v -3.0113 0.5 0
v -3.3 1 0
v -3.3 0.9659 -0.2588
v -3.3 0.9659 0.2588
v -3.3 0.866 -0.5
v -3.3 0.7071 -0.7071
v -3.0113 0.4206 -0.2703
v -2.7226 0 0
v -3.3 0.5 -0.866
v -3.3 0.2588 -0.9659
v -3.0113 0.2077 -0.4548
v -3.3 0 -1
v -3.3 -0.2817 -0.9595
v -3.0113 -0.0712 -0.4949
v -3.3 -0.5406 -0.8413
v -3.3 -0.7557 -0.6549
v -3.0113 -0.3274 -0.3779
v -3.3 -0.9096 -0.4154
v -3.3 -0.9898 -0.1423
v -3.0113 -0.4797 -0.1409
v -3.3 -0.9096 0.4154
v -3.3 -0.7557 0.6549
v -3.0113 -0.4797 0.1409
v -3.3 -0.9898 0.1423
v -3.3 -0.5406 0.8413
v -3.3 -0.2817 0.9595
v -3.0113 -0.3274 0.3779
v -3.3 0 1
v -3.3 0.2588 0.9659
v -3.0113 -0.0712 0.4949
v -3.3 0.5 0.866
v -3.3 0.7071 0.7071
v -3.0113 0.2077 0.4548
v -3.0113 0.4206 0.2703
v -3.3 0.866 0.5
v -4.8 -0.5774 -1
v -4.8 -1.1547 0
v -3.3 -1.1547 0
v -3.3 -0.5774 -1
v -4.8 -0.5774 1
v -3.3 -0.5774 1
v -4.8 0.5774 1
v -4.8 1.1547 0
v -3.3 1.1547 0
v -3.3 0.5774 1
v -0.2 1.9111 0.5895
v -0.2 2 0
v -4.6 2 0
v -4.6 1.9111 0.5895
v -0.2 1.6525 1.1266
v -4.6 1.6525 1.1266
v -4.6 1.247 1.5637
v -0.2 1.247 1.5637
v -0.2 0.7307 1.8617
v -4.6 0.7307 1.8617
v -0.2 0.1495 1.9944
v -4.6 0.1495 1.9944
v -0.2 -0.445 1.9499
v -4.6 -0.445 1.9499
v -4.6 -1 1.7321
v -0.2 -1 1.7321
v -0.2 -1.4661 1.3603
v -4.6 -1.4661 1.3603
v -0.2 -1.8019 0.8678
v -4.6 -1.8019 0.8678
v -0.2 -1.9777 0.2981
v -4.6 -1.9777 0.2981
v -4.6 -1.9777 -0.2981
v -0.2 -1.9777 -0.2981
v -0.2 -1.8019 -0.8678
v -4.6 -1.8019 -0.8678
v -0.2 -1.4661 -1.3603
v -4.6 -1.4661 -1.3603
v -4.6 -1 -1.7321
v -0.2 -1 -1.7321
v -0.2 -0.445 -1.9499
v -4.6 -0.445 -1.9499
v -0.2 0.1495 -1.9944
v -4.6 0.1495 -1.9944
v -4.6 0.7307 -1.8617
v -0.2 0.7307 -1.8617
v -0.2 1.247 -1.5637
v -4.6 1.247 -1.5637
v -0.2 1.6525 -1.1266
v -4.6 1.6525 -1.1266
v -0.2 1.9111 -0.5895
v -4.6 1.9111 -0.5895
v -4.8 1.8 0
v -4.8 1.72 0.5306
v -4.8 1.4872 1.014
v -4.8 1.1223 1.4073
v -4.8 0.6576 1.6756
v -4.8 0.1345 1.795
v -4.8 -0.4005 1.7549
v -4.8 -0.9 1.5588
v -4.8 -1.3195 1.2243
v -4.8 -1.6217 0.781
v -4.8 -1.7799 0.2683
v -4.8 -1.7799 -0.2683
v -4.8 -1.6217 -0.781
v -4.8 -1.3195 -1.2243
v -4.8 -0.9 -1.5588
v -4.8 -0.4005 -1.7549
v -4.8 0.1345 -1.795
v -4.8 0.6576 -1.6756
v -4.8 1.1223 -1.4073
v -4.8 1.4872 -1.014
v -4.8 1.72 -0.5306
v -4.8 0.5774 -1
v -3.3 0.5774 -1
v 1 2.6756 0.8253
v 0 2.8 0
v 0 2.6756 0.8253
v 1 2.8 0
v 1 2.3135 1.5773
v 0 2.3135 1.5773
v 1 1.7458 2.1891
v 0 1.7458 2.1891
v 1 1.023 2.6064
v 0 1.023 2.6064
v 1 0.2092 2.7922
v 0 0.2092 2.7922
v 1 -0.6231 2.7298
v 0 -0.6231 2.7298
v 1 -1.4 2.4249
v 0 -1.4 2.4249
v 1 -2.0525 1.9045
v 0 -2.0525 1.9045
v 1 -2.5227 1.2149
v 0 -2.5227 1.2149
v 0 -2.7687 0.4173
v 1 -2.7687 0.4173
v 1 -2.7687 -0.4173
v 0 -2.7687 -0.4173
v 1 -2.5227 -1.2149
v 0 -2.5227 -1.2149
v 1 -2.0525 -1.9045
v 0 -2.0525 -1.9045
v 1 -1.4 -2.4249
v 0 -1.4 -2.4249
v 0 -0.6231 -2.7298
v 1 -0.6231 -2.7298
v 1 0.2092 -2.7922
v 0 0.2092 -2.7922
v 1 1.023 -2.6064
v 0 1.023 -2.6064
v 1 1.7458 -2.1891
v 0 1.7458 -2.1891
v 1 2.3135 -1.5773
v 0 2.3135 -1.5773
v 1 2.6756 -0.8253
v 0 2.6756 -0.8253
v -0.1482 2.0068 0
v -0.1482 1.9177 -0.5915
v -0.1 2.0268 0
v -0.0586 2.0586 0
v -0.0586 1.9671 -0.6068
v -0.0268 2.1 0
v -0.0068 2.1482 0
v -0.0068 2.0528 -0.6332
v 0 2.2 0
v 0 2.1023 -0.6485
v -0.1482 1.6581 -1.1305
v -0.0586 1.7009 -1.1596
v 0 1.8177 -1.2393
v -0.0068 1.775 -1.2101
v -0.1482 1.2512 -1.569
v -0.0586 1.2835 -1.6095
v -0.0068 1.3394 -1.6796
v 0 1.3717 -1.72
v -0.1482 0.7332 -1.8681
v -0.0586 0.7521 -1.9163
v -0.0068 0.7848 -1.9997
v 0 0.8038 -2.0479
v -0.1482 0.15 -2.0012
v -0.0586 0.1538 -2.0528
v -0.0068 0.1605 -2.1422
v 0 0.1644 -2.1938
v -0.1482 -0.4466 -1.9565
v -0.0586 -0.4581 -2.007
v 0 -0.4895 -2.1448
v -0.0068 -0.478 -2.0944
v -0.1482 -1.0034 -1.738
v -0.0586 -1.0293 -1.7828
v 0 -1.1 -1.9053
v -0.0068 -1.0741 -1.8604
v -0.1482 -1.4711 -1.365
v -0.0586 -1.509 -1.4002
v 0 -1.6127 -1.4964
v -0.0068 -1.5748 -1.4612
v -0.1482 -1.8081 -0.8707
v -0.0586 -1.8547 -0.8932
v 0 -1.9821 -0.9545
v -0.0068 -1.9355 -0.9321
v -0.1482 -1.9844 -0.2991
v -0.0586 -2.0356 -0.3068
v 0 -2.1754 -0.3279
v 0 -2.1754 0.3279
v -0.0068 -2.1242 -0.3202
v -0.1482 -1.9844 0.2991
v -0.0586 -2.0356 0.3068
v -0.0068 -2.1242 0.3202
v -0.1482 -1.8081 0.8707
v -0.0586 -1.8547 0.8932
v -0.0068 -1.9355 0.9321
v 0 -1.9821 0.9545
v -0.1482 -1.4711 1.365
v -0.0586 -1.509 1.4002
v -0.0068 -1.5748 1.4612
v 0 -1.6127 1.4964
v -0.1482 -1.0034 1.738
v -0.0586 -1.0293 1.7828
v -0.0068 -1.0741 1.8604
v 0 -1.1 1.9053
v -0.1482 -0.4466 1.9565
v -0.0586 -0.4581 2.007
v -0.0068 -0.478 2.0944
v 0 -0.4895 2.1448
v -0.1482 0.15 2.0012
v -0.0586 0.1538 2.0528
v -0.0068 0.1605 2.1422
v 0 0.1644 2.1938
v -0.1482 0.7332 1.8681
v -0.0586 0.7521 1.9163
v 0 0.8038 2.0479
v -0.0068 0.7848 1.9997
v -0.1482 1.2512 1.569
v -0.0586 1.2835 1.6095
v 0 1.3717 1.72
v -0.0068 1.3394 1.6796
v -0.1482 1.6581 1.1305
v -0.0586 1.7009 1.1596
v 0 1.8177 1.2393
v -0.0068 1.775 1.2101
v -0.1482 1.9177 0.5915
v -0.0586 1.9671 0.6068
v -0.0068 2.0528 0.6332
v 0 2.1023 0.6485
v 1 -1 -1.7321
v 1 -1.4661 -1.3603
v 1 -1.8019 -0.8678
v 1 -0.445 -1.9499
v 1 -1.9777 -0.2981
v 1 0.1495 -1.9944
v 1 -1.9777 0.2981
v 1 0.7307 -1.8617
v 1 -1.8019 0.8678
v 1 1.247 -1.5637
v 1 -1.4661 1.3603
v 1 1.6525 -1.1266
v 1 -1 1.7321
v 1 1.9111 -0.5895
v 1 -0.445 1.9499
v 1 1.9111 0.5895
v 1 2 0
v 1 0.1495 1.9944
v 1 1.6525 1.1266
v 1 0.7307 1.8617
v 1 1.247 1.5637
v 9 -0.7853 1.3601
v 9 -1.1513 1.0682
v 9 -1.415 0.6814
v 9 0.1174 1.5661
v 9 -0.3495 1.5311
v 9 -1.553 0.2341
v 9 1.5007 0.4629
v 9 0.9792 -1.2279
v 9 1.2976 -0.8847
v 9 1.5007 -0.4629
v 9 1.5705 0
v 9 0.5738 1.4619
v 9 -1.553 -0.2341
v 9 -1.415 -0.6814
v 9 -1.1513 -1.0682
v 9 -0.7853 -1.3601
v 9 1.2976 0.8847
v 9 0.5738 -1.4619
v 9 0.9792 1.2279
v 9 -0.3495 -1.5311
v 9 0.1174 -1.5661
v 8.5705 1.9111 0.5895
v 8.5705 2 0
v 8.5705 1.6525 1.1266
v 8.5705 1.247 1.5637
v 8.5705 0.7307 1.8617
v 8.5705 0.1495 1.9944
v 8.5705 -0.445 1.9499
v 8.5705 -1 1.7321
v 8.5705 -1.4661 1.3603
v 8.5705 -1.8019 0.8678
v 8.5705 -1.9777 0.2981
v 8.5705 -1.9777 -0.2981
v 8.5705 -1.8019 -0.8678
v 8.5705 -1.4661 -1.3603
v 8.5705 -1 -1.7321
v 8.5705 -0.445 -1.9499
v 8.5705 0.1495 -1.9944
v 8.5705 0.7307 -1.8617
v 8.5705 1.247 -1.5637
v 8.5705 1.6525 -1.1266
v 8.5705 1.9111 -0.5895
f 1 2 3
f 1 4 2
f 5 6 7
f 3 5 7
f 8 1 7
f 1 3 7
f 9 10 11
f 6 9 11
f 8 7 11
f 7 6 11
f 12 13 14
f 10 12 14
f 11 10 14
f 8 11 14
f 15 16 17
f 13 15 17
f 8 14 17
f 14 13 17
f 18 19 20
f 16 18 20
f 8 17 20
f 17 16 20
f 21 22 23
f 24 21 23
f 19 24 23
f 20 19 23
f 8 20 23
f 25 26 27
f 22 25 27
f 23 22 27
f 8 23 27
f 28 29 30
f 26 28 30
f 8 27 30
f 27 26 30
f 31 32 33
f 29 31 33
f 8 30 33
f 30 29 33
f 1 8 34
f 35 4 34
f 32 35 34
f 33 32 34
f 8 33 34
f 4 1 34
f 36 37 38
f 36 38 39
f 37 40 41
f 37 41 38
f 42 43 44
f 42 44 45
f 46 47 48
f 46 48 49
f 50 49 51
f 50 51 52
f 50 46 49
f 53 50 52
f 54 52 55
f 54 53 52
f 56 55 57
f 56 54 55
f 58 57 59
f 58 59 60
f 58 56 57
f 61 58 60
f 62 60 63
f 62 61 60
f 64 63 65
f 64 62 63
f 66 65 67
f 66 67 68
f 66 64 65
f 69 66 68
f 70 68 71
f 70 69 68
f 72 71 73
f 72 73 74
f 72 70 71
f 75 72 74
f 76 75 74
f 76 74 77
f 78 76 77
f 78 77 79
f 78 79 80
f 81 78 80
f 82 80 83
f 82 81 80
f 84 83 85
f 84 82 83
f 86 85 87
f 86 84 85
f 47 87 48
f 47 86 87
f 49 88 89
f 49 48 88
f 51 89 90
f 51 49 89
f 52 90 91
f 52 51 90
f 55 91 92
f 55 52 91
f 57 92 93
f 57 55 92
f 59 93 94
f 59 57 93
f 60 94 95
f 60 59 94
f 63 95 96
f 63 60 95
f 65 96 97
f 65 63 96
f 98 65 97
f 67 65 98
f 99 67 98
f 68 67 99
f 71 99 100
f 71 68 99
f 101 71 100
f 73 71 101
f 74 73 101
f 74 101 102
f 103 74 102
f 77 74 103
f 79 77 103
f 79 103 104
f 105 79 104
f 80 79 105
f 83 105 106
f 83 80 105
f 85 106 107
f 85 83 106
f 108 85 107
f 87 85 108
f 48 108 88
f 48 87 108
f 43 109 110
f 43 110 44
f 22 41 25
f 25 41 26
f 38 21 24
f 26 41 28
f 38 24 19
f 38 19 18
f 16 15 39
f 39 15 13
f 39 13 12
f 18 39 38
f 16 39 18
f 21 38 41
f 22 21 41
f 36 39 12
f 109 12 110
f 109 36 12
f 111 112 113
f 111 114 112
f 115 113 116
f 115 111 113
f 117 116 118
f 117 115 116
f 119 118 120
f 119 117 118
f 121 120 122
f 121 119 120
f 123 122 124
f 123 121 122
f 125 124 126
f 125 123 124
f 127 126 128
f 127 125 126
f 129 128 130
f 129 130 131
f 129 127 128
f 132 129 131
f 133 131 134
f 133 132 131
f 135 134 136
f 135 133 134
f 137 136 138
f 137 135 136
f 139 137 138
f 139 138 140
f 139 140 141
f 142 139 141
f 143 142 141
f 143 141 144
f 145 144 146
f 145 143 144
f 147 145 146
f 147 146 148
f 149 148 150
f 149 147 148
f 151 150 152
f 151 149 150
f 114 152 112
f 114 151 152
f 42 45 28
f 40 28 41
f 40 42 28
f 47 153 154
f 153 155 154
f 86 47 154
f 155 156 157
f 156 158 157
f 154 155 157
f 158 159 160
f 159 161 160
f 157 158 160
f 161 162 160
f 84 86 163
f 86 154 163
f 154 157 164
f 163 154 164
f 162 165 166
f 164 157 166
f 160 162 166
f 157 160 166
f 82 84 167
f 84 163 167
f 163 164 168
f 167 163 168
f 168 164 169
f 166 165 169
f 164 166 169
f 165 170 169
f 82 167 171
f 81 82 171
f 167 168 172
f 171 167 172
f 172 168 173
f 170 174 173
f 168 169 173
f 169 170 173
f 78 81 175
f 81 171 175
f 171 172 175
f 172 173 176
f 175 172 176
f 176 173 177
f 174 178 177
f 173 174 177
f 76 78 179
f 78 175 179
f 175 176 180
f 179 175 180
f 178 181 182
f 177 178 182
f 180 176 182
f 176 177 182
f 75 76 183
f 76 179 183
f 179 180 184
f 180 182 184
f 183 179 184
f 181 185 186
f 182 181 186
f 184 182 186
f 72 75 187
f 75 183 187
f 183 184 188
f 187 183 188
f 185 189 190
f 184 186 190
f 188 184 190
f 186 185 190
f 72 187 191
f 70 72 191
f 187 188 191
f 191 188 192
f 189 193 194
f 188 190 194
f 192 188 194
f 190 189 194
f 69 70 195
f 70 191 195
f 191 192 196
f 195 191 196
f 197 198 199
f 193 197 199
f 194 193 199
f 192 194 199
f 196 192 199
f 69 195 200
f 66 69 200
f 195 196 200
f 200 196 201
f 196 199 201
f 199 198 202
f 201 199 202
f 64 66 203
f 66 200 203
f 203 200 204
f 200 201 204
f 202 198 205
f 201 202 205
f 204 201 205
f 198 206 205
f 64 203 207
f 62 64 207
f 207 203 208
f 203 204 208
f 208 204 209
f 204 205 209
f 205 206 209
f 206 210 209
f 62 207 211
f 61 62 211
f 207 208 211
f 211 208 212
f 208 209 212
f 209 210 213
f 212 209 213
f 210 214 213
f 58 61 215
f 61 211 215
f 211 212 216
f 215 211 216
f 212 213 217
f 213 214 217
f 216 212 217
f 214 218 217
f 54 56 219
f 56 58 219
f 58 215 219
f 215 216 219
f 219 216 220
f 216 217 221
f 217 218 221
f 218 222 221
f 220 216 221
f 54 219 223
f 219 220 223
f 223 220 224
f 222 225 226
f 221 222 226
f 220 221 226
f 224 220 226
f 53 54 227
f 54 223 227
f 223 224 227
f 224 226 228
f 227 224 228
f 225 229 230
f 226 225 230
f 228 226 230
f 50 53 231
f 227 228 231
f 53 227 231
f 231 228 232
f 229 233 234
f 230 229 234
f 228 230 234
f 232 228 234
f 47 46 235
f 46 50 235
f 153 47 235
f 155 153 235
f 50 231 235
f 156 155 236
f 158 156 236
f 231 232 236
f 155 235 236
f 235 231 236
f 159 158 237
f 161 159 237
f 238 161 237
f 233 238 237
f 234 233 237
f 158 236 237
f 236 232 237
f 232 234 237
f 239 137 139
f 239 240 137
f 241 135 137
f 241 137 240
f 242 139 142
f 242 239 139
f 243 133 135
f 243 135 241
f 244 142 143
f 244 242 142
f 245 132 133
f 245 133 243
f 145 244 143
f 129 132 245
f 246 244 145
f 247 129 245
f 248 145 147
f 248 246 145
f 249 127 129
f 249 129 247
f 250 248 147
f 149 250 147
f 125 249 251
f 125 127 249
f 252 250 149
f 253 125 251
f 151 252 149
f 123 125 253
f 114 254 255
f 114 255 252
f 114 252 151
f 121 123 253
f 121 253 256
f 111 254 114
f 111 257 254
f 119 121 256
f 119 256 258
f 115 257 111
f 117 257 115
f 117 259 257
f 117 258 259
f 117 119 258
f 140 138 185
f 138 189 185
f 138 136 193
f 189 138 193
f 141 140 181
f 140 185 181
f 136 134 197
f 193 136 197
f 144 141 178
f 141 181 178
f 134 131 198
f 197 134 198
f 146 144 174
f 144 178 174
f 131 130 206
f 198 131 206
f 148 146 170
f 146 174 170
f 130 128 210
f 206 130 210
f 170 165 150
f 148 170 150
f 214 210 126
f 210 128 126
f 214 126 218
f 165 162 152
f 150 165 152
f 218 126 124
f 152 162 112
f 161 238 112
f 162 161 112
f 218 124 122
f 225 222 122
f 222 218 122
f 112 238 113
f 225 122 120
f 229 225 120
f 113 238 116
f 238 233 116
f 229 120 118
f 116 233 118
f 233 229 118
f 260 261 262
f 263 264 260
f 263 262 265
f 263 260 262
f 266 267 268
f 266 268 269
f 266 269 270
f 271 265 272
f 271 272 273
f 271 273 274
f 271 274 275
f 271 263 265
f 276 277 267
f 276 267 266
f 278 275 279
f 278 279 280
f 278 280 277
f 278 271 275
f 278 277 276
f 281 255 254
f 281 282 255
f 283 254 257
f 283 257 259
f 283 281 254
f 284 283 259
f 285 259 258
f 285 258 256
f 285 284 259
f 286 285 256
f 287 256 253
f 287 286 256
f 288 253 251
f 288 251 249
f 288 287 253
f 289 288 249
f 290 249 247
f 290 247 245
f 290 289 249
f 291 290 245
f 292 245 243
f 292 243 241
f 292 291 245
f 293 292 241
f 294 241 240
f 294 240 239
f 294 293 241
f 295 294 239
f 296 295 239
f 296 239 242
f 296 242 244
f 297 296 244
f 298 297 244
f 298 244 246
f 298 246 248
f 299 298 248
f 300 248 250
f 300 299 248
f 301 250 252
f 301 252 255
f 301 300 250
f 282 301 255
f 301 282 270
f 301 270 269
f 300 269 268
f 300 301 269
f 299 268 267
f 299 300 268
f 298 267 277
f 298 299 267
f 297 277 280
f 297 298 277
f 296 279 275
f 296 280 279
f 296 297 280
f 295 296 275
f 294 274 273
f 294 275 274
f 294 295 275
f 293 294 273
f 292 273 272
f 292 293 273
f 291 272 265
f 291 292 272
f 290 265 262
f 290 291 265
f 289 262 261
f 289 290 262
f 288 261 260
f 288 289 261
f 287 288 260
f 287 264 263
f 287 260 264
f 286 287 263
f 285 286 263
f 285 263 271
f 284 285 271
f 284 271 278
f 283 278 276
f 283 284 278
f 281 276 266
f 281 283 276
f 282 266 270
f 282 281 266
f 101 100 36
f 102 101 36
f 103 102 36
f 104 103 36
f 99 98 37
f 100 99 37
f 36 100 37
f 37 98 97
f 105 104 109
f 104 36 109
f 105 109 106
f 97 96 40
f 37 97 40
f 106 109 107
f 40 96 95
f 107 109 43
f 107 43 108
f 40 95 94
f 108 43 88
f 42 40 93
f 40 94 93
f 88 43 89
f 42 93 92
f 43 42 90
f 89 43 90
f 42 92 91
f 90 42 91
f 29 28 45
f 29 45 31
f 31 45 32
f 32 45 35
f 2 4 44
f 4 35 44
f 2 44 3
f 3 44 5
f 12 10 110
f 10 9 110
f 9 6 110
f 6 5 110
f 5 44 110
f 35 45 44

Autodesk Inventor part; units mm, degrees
sketch "Sketch_1" plane through (0, 0, 0) normal (0, 0, 1) x (1, 0, 0)
  line L0 (1, 0) -> (-4.8, 0)
  line L1 (-4.8, 0) -> (-4.8, 1.8)
  line L2 (-4.8, 1.8) -> (-4.6, 2)
  line L3 (-4.6, 2) -> (-0.2, 2)
  arc A0 (-0.2, 2) -> (0, 2.2) centre (-0.2, 2.2) ccw
  line L4 (0, 2.2) -> (0, 2.8)
  line L5 (0, 2.8) -> (1, 2.8)
  line L6 (1, 2.8) -> (1, 0)
  line L7 (1, 0) -> (-4.8, 0)
revolve "Revolution1" add sketch "Sketch_1" angle 360 about axis through (1, 0, 0) along (1, 0, 0)
sketch "Sketch_5" plane through (0, 0, 0) normal (0, 0, 1) x (1, 0, 0)
  line L0 (9, 0) -> (1, 0)
  line L1 (1, 0) -> (1, 2)
  line L2 (1, 2) -> (8.5705, 2)
  line L3 (8.5705, 2) -> (9, 1.5705)
  line L4 (9, 1.5705) -> (9, 0)
  line L5 (9, 0) -> (1, 0)
revolve "Revolution2" add sketch "Sketch_5" angle 360 about axis through (9, 0, 0) along (1, 0, 0)
thread "Thread1" size "M4x0.7" class "6g" standard "ISO Metric profile" length 6.1705
sketch "Sketch_2" plane through (-4.8, 0, 0) normal (1, 0, 0) x (0, 0, -1)
  line L0 (-1, -0.5774) -> (0, -1.1547)
  line L1 (0, -1.1547) -> (1, -0.5774)
  line L2 (1, -0.5774) -> (1, 0.5774)
  line L3 (1, 0.5774) -> (0, 1.1547)
  line L4 (0, 1.1547) -> (-1, 0.5774)
  line L5 (-1, 0.5774) -> (-1, -0.5774)
extrude "Extrusion1" cut sketch "Sketch_2" along normal blind 1.5
sketch "Sketch_3" plane through (0, 0, 0) normal (0, 0, 1) x (1, 0, 0)
  line L0 (-2.7226, 0) -> (-3.3, 0)
  line L1 (-3.3, 0) -> (-3.3, 1)
  line L2 (-3.3, 1) -> (-2.7226, 0)
  line L3 (-2.7226, 0) -> (-3.3, 0)
revolve "Revolution3" cut sketch "Sketch_3" angle 360 about axis through (-2.7226, 0, 0) along (1, 0, 0)
ref_plane "shaft_to_bearing_XY" through (0, 0, 0) normal (1, 0, 0) x (0, 0, -1)
ref_plane "shaft_to_bearing_YZ" through (0, 0, 0) normal (0, 0, -1) x (0, 1, 0)
ref_plane "shaft_to_bearing_ZX" through (0, 0, 0) normal (0, 1, 0) x (1, 0, 0)
properties part number "E-NTBGT13-8_b"
